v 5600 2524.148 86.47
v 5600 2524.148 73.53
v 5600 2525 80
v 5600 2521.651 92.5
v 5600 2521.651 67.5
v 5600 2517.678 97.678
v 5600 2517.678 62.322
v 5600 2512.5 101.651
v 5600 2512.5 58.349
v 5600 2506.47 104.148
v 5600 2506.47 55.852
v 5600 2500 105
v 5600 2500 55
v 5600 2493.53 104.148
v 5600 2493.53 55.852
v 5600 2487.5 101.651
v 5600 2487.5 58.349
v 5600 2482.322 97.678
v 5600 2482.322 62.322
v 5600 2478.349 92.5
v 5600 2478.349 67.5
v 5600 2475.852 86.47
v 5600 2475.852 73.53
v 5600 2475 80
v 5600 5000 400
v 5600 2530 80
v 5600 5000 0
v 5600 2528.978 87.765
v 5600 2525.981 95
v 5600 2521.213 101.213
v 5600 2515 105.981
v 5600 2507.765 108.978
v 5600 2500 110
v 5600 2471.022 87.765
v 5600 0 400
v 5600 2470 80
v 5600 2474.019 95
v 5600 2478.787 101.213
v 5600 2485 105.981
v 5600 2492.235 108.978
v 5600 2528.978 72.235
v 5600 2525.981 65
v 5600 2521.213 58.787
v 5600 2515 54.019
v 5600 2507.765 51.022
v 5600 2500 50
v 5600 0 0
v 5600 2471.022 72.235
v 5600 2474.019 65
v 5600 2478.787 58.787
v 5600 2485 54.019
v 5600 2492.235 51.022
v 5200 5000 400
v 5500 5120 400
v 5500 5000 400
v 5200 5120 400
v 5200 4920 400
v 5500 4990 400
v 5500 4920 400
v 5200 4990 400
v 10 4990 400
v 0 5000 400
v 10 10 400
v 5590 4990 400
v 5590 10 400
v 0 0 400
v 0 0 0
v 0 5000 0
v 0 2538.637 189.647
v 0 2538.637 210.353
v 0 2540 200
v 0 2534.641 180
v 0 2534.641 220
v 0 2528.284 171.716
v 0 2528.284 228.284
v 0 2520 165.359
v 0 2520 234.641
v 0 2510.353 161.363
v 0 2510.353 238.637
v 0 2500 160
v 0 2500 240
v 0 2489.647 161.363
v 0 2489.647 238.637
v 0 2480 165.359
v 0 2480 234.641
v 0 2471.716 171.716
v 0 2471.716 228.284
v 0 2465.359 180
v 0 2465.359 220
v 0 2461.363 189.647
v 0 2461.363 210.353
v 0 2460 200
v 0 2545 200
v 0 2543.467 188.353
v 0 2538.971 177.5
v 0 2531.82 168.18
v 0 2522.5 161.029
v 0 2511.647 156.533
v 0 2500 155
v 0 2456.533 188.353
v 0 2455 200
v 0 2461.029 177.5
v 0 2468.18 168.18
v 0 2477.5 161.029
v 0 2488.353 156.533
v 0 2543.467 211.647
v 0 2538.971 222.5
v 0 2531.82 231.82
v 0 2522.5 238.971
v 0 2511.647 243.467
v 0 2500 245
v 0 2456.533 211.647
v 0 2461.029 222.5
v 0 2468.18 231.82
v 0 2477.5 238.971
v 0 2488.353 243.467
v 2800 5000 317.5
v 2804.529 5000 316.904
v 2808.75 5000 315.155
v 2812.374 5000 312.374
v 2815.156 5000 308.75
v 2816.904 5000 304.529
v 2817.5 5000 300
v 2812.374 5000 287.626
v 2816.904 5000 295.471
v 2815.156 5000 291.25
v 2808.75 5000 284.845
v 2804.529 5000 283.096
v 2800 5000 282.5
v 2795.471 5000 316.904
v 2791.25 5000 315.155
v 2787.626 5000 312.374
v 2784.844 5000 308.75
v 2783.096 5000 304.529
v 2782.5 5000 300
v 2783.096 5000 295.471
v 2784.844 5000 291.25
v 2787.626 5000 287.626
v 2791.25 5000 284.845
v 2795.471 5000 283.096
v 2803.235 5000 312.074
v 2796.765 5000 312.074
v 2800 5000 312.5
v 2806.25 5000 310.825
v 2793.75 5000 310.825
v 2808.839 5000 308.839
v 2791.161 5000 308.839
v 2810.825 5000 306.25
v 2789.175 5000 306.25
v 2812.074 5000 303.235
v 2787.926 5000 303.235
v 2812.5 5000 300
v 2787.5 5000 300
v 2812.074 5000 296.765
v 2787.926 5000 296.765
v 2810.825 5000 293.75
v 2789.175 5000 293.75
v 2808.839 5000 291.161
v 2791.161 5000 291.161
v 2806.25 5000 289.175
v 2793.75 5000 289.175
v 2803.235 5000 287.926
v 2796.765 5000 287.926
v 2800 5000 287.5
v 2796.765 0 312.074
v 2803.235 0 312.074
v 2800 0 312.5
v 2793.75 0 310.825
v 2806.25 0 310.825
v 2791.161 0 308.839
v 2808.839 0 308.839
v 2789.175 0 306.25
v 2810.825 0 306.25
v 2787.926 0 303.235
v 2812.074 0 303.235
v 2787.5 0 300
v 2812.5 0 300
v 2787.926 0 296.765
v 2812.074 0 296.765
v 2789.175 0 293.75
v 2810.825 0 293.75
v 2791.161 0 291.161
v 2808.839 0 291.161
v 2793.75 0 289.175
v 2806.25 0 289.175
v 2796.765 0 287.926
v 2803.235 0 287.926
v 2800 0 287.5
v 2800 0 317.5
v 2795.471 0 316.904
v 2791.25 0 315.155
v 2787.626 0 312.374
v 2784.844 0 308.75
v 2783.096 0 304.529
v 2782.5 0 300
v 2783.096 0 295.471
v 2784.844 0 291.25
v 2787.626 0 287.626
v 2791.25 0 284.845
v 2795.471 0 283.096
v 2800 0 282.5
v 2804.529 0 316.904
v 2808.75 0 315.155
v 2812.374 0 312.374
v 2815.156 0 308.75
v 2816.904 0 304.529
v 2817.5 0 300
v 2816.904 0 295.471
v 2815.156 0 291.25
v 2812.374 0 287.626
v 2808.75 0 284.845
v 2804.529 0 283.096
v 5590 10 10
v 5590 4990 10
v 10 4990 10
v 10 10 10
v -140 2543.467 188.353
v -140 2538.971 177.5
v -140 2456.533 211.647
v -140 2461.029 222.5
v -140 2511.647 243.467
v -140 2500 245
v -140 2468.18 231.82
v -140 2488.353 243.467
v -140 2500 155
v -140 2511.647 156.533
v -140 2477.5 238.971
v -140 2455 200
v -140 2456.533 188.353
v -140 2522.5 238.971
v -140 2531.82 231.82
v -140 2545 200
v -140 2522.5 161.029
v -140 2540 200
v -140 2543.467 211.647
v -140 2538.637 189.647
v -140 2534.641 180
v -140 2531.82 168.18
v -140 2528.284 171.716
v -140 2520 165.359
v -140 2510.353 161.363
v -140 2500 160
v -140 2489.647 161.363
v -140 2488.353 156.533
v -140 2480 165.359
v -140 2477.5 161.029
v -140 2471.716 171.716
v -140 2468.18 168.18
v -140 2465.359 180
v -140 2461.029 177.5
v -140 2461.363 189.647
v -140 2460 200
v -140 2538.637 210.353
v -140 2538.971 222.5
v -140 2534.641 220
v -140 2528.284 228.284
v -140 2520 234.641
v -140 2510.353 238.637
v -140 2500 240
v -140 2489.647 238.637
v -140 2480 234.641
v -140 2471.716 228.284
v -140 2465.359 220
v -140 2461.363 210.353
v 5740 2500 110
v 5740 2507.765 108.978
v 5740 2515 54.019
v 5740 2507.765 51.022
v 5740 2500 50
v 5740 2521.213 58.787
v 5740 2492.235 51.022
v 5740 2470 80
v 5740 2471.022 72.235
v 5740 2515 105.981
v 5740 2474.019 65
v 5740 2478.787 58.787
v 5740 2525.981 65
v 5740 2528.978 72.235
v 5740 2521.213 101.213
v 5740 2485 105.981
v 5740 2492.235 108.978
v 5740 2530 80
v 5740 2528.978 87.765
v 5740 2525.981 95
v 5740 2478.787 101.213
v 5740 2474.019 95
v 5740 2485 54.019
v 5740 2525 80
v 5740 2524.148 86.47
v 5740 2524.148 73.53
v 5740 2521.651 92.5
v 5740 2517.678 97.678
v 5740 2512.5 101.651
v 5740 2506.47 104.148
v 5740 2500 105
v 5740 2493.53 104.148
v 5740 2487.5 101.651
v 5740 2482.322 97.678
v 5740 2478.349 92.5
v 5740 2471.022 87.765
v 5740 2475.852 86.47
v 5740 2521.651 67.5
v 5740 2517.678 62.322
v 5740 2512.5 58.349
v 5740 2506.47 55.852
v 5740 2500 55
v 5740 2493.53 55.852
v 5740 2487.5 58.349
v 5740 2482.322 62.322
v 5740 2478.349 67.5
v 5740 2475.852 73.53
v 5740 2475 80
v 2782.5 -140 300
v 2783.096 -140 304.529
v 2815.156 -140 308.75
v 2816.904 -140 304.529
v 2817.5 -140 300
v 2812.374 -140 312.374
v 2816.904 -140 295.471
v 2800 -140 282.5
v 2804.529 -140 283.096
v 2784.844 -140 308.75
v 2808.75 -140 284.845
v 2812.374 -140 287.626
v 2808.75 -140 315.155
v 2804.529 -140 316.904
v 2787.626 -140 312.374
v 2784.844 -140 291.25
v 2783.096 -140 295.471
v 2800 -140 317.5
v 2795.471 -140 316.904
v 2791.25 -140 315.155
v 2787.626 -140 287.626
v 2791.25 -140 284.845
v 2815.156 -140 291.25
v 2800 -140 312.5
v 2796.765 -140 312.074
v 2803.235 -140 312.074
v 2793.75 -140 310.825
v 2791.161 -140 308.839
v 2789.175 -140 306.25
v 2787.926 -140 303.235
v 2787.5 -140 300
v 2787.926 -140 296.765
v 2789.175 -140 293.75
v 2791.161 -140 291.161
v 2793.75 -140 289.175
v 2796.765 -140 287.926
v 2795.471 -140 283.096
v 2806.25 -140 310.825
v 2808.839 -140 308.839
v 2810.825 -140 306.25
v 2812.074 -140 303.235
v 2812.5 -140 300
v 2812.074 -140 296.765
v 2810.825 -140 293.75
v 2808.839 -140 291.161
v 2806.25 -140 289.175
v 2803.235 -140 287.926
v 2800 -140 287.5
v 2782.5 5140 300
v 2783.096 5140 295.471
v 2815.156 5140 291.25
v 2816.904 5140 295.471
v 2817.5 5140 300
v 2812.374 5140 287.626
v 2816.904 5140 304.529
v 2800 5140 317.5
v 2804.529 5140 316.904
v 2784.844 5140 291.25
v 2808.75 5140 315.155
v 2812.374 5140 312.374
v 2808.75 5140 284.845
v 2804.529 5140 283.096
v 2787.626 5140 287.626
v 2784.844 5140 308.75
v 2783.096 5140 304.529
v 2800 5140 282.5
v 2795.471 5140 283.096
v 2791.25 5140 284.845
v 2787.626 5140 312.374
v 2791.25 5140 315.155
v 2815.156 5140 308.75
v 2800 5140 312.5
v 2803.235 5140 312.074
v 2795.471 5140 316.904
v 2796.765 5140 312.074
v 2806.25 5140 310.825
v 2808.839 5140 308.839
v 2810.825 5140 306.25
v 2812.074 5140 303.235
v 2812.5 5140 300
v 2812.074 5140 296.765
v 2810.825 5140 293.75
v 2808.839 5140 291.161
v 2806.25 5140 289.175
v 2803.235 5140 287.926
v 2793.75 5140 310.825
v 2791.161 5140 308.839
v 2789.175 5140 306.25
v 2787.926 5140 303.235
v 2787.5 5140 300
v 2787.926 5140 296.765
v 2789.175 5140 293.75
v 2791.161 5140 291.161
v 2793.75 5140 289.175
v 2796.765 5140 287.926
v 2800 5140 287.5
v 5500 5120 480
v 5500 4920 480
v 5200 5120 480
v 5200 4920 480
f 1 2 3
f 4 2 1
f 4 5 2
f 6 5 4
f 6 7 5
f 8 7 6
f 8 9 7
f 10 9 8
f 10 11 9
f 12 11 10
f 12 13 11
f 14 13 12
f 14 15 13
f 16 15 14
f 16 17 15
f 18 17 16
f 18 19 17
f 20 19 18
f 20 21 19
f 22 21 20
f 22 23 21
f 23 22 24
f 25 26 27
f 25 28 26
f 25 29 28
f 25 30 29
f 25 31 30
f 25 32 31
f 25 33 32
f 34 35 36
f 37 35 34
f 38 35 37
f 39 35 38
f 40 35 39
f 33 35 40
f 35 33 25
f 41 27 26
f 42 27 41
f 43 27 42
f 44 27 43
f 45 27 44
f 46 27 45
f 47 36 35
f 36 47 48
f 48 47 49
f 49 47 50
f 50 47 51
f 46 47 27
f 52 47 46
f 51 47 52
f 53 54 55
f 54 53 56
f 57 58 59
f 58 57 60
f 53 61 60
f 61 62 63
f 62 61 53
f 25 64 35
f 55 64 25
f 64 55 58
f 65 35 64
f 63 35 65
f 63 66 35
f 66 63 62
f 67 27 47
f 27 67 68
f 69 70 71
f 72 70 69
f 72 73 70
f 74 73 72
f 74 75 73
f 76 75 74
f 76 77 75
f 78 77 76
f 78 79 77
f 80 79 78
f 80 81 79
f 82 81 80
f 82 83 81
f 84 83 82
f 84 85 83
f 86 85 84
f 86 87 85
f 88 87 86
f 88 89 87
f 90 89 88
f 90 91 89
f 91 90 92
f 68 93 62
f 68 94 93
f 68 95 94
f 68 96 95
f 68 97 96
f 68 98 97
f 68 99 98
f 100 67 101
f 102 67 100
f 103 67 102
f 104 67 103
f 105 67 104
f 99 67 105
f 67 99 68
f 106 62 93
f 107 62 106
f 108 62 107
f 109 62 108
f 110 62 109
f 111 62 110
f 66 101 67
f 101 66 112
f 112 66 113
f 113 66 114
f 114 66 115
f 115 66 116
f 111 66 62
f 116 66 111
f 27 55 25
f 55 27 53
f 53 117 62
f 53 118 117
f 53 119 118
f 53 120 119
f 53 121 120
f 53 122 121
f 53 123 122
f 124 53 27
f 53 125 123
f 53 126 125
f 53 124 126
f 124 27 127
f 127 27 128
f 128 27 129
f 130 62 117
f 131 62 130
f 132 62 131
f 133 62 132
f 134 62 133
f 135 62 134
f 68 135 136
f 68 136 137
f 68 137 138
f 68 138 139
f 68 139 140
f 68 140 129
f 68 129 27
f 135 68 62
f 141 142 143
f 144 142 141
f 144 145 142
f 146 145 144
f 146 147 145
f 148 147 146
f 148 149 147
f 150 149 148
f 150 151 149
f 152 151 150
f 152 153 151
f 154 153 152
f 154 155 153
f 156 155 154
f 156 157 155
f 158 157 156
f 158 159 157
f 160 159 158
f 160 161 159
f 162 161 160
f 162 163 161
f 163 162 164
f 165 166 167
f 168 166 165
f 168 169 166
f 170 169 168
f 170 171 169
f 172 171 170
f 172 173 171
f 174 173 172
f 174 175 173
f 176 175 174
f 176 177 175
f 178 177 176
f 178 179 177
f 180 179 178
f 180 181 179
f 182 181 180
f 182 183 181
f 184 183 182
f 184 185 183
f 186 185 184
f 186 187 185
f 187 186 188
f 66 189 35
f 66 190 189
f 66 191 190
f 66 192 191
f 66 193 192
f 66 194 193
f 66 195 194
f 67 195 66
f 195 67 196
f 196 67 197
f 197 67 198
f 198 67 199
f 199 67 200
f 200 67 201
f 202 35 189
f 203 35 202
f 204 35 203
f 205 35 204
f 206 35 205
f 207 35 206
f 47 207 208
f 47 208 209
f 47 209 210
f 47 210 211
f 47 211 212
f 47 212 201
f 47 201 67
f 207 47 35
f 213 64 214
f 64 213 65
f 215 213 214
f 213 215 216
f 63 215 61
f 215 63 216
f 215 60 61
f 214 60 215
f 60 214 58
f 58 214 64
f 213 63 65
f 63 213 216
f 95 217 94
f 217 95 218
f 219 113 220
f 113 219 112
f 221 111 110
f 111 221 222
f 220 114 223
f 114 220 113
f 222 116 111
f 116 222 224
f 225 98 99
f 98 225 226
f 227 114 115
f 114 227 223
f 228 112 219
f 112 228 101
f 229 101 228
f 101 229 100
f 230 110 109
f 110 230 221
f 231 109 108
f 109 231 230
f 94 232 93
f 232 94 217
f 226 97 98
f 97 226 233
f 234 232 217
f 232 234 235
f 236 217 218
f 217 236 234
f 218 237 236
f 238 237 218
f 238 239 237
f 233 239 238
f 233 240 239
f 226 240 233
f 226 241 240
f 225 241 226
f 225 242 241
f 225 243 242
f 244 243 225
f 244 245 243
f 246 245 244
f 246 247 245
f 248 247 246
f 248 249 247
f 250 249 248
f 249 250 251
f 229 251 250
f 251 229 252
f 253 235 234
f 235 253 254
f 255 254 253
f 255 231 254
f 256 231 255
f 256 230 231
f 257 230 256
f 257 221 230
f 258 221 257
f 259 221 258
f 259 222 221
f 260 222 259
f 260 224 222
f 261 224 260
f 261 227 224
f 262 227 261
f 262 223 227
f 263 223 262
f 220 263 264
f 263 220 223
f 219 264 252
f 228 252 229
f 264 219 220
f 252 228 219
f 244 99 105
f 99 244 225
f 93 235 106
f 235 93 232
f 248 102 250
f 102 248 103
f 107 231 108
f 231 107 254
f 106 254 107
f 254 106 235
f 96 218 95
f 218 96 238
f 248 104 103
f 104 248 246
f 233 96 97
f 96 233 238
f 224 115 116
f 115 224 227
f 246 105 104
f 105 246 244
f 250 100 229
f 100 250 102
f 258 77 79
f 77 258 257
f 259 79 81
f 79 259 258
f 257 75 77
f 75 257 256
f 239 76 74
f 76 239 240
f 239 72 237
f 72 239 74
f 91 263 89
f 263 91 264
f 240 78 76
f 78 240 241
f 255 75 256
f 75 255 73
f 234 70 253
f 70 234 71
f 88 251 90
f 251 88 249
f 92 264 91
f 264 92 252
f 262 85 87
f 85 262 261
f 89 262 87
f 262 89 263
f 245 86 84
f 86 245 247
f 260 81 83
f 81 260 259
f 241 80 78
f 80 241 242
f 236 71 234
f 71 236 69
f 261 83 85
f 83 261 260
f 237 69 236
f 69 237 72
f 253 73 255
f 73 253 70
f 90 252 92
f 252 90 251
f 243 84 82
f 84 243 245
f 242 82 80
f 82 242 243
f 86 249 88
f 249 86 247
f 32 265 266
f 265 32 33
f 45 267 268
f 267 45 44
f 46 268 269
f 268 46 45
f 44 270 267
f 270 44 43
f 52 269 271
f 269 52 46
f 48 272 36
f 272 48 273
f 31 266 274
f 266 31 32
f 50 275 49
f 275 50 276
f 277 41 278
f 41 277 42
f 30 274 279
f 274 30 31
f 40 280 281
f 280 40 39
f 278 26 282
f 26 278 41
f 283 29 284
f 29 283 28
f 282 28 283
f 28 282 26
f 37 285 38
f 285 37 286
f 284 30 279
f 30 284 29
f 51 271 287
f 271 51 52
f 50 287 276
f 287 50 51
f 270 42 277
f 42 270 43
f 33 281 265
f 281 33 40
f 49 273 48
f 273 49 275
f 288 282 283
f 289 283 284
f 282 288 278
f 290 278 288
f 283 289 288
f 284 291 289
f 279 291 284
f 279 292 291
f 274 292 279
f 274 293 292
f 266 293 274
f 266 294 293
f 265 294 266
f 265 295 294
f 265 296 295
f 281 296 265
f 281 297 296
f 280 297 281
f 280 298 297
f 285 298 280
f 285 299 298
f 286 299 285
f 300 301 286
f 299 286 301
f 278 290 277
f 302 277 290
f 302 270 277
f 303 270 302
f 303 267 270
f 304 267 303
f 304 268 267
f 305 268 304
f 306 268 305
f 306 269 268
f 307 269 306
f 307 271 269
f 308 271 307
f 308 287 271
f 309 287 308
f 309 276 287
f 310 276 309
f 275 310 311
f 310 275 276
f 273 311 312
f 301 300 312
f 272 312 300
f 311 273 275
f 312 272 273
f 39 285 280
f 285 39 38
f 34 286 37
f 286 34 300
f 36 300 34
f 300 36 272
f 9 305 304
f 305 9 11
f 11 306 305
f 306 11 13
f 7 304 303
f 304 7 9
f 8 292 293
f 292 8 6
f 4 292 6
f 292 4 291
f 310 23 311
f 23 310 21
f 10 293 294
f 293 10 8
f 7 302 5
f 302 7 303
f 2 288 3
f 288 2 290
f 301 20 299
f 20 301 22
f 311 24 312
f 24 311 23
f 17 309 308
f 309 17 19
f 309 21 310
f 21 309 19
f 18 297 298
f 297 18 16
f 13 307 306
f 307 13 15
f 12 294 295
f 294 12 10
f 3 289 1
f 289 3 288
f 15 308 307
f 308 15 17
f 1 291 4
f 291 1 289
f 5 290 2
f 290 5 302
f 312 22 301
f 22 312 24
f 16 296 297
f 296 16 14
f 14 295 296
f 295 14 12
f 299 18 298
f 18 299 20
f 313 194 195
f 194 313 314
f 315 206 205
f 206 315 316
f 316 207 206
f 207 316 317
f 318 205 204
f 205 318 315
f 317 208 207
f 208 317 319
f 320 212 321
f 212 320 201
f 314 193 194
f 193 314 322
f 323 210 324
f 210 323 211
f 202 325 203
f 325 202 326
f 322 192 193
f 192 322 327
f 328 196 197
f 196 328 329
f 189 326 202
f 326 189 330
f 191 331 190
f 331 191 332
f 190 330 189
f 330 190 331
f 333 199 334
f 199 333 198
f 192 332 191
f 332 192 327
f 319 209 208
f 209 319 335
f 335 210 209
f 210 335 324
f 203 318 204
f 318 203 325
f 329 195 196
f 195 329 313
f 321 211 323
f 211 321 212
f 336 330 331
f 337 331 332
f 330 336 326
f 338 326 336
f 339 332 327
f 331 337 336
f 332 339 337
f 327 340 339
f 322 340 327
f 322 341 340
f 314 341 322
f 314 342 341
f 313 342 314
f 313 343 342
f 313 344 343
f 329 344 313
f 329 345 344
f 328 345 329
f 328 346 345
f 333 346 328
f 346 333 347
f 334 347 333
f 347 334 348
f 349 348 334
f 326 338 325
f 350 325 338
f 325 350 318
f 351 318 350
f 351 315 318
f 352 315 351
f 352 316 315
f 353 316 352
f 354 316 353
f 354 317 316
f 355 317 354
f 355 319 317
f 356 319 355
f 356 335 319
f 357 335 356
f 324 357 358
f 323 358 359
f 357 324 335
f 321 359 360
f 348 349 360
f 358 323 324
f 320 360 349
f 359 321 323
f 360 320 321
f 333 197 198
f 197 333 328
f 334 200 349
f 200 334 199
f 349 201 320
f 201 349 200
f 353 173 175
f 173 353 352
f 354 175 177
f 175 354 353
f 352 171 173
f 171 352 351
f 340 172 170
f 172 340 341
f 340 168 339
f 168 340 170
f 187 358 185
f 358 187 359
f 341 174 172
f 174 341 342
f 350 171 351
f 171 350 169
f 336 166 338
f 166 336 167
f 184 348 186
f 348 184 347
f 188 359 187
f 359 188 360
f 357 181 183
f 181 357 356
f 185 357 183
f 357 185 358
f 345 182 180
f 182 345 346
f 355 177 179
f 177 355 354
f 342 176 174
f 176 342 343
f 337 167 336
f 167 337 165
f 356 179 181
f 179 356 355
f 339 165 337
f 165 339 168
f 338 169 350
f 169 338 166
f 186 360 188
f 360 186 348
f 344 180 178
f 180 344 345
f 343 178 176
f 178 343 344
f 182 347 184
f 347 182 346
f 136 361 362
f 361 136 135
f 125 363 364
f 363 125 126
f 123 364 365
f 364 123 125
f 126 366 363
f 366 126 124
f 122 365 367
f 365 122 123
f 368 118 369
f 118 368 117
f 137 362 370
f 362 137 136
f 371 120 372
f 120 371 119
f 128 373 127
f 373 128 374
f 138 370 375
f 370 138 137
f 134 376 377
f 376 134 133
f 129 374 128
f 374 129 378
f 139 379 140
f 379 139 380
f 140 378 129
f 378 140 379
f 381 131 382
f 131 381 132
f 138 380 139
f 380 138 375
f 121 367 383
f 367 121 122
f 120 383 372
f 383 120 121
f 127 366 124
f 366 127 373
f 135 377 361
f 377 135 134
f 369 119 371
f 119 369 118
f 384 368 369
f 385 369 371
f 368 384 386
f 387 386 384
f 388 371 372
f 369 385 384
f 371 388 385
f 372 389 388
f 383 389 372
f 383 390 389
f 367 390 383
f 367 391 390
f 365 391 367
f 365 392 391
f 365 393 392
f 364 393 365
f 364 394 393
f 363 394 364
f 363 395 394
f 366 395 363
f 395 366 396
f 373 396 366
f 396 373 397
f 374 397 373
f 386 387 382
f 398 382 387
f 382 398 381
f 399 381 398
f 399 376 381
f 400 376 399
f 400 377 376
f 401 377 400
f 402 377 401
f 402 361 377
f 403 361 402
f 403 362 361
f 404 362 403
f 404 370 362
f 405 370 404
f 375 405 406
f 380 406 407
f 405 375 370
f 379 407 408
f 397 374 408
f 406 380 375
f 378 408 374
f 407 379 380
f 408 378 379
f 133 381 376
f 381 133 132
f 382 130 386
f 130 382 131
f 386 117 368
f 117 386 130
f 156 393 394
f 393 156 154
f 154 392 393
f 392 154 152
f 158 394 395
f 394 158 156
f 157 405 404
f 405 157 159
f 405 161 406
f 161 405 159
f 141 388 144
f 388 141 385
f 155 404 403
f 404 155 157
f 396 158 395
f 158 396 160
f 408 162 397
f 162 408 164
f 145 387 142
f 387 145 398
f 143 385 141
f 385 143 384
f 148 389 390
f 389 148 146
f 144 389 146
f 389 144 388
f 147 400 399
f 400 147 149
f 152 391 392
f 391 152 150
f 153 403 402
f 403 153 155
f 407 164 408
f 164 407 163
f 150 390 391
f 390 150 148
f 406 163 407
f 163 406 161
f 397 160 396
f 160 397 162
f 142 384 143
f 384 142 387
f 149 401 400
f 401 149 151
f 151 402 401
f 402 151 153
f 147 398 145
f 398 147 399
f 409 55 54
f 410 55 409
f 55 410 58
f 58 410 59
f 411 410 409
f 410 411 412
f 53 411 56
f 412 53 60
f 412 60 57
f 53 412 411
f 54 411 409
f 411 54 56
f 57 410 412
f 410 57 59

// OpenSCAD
// file: ../params.scad
// Shared millimetre parameters. Keep in lockstep with freecad/params.py.
// Module scale: 150 kg/day wet train. Walls are CPVC sheet, not metal.

$fn = 36;

WALL        = 12;     // CPVC sheet thickness
FLOOR       = 16;     // floor plate (trough sits on this)

// LEACH CSTR 1 — inside liquor box
CSTR_L      = 2000;
CSTR_W      = 1200;
CSTR_H      = 1400;   // liquid + freeboard
FREEBOARD   = 200;

// CSTR 2 weir (same vessel, +X wall)
WEIR_W      = 450;
WEIR_CREST  = CSTR_H - FREEBOARD;   // from inner floor
WEIR_SLOT_H = 80;
WEIR_LIP    = 120;    // external spout projection

// CSTR 3 floor auger — injection-molded PVC / FG
AUGER_D     = 140;    // flight OD
AUGER_SHAFT = 40;
AUGER_PITCH = 110;
AUGER_TROUGH_W = 180;
AUGER_TROUGH_H = 110;
AUGER_OFFSET_Y = 280; // trough centreline from inner -Y wall
AUGER_INCLINE  = 28;  // deg, lifts out of liquor toward +X

// mixer / nozzles (lid)
MIXER_D     = 50;
GAS_D       = 80;     // acid-gas takeoff
DROP_X      = 80;     // inner-X of shred drop slot
DROP_L      = 400;
DROP_W      = 250;
DROP_COAM   = 80;     // raised coaming around the slot

// LEACHATE PUMP / coarse strainer — −X wall, opposite the weir
PUMP_D      = 80;     // DN80
PUMP_Z      = 450;    // centreline above inner floor (submerged)
PUMP_Y      = 900;    // centreline from inner −Y (away from auger)
STRAINER_L  = 180;
STRAINER_W  = 140;
STRAINER_H  = 160;

// mezzanine feed train
MEZZ_H      = 2200;   // platform top above tank outer floor
MEZZ_L      = 1600;   // platform length in −X
MEZZ_THK    = 12;
HOPPER_L    = 700;
HOPPER_W    = 600;
HOPPER_H    = 800;
SHRED_L     = 500;
SHRED_W     = 500;
SHRED_H     = 450;
CONV_W      = 240;
CONV_H      = 120;
CONV_PLATE  = 6;      // trough plate
CONV_FLANGE = 40;
CONV_SPRING_D = 50;
CONV_SPRING_H = 80;
CONV_BOLT   = 10;     // M10 clearance
CONV_LEN    = 1800;   // default standalone length; plant instance is computed
DUST_D      = 150;    // dust-hood outlet to DUST header
AUGER_LIFT_L = 700;

// dewater belts + split (Phase A 4–6)
FDEW_L      = 1800;
FDEW_W      = 450;
FDEW_H      = 80;
FDEW_RISE   = 120;    // solids end higher so liquor runs back to weir
SDEW_L      = 1400;
SDEW_W      = 220;
SDEW_H      = 80;
SPLIT_L     = 600;
SPLIT_W     = 500;
SPLIT_H     = 400;
STUB_L      = 400;
STUB_W      = 300;
STUB_H      = 250;

// EW funnel cell
EW_L        = 600;    // along aisle (overflow direction)
EW_W        = 420;    // anode-cathode depth
EW_H        = 650;    // rectangular body
EW_FUNNEL_H = 220;
EW_VALVE_D  = 50;
EW_VALVE_L  = 60;
EW_MEM_T    = 4;      // CEM
EW_SLOT     = 10;     // membrane cassette slot
EW_PITCH    = 750;    // aisle spacing, centre to centre
AISLE_X0    = 200;
AISLE_Y     = -(EW_W + 2*WALL) - 400;
AISLE_Z     = 400;
BUND_H      = 150;
BUND_PAD    = 250;
SUMP_L      = 400;
SUMP_W      = 400;
SUMP_H      = 300;
VDF_D       = 700;
VDF_L       = 900;
PAIL_W      = 180;
HDR_D       = 80;
HDR_Z       = 1400;
PYRO_D      = 320;
PYRO_L      = 2800;

// Campus envelopes — lockstep with freecad/params.py
FARM_X=12000; FARM_Y=8000; FARM_L=12000; FARM_W=8000; FARM_H=4500;
FAB_X=12000;  FAB_Y=-6000; FAB_L=8000;   FAB_W=6000;  FAB_H=4000;
HAB_X=-8000;  HAB_Y=8000;  HAB_L=8000;   HAB_W=6000;  HAB_H=3200;
CRYO_X=-6000; CRYO_Y=-4000; CRYO_L=4000; CRYO_W=3000; CRYO_H=3000;
MFG_X=2000;   MFG_Y=9000;  MFG_L=6000;   MFG_W=4000;  MFG_H=3500;

LIFE_Z_GREY=900; LIFE_Z_UPW=1100; LIFE_Z_ETCH=1300;
LIFE_Z_O2=2800; LIFE_Z_N2=3000; LIFE_Z_CO2=3200;
LIFE_D_GREY=50; LIFE_D_UPW=40; LIFE_D_ETCH=32;
LIFE_D_GAS=25; LIFE_D_CO2=40;
// main file
// GROW BED — trough + G1–G4. G5 is a chute, not a pipe.
include <../params.scad>;
$fn = 24;
L=5600; W=5000; H=400; T=10;

module stub(d, l=140) {
    difference() {
        cylinder(h=l, d=d+10);
        translate([0,0,-1]) cylinder(h=l+2, d=d);
    }
}

module mfg_grow_bed() {
    difference() {
        cube([L, W, H]);
        translate([T, T, T]) cube([L-2*T, W-2*T, H]);
    }
    translate([0, W/2, 200]) rotate([0,-90,0]) stub(80); // G1
    translate([L, W/2, 80]) rotate([0,90,0]) stub(50);   // G2
    translate([L/2, 0, 300]) rotate([90,0,0]) stub(25);  // G3 CO2
    translate([L/2, W, 300]) rotate([-90,0,0]) stub(25); // G4 O2
    translate([L-400, W-80, H]) cube([300, 200, 80]);    // G5 chute lip
}

mfg_grow_bed();
